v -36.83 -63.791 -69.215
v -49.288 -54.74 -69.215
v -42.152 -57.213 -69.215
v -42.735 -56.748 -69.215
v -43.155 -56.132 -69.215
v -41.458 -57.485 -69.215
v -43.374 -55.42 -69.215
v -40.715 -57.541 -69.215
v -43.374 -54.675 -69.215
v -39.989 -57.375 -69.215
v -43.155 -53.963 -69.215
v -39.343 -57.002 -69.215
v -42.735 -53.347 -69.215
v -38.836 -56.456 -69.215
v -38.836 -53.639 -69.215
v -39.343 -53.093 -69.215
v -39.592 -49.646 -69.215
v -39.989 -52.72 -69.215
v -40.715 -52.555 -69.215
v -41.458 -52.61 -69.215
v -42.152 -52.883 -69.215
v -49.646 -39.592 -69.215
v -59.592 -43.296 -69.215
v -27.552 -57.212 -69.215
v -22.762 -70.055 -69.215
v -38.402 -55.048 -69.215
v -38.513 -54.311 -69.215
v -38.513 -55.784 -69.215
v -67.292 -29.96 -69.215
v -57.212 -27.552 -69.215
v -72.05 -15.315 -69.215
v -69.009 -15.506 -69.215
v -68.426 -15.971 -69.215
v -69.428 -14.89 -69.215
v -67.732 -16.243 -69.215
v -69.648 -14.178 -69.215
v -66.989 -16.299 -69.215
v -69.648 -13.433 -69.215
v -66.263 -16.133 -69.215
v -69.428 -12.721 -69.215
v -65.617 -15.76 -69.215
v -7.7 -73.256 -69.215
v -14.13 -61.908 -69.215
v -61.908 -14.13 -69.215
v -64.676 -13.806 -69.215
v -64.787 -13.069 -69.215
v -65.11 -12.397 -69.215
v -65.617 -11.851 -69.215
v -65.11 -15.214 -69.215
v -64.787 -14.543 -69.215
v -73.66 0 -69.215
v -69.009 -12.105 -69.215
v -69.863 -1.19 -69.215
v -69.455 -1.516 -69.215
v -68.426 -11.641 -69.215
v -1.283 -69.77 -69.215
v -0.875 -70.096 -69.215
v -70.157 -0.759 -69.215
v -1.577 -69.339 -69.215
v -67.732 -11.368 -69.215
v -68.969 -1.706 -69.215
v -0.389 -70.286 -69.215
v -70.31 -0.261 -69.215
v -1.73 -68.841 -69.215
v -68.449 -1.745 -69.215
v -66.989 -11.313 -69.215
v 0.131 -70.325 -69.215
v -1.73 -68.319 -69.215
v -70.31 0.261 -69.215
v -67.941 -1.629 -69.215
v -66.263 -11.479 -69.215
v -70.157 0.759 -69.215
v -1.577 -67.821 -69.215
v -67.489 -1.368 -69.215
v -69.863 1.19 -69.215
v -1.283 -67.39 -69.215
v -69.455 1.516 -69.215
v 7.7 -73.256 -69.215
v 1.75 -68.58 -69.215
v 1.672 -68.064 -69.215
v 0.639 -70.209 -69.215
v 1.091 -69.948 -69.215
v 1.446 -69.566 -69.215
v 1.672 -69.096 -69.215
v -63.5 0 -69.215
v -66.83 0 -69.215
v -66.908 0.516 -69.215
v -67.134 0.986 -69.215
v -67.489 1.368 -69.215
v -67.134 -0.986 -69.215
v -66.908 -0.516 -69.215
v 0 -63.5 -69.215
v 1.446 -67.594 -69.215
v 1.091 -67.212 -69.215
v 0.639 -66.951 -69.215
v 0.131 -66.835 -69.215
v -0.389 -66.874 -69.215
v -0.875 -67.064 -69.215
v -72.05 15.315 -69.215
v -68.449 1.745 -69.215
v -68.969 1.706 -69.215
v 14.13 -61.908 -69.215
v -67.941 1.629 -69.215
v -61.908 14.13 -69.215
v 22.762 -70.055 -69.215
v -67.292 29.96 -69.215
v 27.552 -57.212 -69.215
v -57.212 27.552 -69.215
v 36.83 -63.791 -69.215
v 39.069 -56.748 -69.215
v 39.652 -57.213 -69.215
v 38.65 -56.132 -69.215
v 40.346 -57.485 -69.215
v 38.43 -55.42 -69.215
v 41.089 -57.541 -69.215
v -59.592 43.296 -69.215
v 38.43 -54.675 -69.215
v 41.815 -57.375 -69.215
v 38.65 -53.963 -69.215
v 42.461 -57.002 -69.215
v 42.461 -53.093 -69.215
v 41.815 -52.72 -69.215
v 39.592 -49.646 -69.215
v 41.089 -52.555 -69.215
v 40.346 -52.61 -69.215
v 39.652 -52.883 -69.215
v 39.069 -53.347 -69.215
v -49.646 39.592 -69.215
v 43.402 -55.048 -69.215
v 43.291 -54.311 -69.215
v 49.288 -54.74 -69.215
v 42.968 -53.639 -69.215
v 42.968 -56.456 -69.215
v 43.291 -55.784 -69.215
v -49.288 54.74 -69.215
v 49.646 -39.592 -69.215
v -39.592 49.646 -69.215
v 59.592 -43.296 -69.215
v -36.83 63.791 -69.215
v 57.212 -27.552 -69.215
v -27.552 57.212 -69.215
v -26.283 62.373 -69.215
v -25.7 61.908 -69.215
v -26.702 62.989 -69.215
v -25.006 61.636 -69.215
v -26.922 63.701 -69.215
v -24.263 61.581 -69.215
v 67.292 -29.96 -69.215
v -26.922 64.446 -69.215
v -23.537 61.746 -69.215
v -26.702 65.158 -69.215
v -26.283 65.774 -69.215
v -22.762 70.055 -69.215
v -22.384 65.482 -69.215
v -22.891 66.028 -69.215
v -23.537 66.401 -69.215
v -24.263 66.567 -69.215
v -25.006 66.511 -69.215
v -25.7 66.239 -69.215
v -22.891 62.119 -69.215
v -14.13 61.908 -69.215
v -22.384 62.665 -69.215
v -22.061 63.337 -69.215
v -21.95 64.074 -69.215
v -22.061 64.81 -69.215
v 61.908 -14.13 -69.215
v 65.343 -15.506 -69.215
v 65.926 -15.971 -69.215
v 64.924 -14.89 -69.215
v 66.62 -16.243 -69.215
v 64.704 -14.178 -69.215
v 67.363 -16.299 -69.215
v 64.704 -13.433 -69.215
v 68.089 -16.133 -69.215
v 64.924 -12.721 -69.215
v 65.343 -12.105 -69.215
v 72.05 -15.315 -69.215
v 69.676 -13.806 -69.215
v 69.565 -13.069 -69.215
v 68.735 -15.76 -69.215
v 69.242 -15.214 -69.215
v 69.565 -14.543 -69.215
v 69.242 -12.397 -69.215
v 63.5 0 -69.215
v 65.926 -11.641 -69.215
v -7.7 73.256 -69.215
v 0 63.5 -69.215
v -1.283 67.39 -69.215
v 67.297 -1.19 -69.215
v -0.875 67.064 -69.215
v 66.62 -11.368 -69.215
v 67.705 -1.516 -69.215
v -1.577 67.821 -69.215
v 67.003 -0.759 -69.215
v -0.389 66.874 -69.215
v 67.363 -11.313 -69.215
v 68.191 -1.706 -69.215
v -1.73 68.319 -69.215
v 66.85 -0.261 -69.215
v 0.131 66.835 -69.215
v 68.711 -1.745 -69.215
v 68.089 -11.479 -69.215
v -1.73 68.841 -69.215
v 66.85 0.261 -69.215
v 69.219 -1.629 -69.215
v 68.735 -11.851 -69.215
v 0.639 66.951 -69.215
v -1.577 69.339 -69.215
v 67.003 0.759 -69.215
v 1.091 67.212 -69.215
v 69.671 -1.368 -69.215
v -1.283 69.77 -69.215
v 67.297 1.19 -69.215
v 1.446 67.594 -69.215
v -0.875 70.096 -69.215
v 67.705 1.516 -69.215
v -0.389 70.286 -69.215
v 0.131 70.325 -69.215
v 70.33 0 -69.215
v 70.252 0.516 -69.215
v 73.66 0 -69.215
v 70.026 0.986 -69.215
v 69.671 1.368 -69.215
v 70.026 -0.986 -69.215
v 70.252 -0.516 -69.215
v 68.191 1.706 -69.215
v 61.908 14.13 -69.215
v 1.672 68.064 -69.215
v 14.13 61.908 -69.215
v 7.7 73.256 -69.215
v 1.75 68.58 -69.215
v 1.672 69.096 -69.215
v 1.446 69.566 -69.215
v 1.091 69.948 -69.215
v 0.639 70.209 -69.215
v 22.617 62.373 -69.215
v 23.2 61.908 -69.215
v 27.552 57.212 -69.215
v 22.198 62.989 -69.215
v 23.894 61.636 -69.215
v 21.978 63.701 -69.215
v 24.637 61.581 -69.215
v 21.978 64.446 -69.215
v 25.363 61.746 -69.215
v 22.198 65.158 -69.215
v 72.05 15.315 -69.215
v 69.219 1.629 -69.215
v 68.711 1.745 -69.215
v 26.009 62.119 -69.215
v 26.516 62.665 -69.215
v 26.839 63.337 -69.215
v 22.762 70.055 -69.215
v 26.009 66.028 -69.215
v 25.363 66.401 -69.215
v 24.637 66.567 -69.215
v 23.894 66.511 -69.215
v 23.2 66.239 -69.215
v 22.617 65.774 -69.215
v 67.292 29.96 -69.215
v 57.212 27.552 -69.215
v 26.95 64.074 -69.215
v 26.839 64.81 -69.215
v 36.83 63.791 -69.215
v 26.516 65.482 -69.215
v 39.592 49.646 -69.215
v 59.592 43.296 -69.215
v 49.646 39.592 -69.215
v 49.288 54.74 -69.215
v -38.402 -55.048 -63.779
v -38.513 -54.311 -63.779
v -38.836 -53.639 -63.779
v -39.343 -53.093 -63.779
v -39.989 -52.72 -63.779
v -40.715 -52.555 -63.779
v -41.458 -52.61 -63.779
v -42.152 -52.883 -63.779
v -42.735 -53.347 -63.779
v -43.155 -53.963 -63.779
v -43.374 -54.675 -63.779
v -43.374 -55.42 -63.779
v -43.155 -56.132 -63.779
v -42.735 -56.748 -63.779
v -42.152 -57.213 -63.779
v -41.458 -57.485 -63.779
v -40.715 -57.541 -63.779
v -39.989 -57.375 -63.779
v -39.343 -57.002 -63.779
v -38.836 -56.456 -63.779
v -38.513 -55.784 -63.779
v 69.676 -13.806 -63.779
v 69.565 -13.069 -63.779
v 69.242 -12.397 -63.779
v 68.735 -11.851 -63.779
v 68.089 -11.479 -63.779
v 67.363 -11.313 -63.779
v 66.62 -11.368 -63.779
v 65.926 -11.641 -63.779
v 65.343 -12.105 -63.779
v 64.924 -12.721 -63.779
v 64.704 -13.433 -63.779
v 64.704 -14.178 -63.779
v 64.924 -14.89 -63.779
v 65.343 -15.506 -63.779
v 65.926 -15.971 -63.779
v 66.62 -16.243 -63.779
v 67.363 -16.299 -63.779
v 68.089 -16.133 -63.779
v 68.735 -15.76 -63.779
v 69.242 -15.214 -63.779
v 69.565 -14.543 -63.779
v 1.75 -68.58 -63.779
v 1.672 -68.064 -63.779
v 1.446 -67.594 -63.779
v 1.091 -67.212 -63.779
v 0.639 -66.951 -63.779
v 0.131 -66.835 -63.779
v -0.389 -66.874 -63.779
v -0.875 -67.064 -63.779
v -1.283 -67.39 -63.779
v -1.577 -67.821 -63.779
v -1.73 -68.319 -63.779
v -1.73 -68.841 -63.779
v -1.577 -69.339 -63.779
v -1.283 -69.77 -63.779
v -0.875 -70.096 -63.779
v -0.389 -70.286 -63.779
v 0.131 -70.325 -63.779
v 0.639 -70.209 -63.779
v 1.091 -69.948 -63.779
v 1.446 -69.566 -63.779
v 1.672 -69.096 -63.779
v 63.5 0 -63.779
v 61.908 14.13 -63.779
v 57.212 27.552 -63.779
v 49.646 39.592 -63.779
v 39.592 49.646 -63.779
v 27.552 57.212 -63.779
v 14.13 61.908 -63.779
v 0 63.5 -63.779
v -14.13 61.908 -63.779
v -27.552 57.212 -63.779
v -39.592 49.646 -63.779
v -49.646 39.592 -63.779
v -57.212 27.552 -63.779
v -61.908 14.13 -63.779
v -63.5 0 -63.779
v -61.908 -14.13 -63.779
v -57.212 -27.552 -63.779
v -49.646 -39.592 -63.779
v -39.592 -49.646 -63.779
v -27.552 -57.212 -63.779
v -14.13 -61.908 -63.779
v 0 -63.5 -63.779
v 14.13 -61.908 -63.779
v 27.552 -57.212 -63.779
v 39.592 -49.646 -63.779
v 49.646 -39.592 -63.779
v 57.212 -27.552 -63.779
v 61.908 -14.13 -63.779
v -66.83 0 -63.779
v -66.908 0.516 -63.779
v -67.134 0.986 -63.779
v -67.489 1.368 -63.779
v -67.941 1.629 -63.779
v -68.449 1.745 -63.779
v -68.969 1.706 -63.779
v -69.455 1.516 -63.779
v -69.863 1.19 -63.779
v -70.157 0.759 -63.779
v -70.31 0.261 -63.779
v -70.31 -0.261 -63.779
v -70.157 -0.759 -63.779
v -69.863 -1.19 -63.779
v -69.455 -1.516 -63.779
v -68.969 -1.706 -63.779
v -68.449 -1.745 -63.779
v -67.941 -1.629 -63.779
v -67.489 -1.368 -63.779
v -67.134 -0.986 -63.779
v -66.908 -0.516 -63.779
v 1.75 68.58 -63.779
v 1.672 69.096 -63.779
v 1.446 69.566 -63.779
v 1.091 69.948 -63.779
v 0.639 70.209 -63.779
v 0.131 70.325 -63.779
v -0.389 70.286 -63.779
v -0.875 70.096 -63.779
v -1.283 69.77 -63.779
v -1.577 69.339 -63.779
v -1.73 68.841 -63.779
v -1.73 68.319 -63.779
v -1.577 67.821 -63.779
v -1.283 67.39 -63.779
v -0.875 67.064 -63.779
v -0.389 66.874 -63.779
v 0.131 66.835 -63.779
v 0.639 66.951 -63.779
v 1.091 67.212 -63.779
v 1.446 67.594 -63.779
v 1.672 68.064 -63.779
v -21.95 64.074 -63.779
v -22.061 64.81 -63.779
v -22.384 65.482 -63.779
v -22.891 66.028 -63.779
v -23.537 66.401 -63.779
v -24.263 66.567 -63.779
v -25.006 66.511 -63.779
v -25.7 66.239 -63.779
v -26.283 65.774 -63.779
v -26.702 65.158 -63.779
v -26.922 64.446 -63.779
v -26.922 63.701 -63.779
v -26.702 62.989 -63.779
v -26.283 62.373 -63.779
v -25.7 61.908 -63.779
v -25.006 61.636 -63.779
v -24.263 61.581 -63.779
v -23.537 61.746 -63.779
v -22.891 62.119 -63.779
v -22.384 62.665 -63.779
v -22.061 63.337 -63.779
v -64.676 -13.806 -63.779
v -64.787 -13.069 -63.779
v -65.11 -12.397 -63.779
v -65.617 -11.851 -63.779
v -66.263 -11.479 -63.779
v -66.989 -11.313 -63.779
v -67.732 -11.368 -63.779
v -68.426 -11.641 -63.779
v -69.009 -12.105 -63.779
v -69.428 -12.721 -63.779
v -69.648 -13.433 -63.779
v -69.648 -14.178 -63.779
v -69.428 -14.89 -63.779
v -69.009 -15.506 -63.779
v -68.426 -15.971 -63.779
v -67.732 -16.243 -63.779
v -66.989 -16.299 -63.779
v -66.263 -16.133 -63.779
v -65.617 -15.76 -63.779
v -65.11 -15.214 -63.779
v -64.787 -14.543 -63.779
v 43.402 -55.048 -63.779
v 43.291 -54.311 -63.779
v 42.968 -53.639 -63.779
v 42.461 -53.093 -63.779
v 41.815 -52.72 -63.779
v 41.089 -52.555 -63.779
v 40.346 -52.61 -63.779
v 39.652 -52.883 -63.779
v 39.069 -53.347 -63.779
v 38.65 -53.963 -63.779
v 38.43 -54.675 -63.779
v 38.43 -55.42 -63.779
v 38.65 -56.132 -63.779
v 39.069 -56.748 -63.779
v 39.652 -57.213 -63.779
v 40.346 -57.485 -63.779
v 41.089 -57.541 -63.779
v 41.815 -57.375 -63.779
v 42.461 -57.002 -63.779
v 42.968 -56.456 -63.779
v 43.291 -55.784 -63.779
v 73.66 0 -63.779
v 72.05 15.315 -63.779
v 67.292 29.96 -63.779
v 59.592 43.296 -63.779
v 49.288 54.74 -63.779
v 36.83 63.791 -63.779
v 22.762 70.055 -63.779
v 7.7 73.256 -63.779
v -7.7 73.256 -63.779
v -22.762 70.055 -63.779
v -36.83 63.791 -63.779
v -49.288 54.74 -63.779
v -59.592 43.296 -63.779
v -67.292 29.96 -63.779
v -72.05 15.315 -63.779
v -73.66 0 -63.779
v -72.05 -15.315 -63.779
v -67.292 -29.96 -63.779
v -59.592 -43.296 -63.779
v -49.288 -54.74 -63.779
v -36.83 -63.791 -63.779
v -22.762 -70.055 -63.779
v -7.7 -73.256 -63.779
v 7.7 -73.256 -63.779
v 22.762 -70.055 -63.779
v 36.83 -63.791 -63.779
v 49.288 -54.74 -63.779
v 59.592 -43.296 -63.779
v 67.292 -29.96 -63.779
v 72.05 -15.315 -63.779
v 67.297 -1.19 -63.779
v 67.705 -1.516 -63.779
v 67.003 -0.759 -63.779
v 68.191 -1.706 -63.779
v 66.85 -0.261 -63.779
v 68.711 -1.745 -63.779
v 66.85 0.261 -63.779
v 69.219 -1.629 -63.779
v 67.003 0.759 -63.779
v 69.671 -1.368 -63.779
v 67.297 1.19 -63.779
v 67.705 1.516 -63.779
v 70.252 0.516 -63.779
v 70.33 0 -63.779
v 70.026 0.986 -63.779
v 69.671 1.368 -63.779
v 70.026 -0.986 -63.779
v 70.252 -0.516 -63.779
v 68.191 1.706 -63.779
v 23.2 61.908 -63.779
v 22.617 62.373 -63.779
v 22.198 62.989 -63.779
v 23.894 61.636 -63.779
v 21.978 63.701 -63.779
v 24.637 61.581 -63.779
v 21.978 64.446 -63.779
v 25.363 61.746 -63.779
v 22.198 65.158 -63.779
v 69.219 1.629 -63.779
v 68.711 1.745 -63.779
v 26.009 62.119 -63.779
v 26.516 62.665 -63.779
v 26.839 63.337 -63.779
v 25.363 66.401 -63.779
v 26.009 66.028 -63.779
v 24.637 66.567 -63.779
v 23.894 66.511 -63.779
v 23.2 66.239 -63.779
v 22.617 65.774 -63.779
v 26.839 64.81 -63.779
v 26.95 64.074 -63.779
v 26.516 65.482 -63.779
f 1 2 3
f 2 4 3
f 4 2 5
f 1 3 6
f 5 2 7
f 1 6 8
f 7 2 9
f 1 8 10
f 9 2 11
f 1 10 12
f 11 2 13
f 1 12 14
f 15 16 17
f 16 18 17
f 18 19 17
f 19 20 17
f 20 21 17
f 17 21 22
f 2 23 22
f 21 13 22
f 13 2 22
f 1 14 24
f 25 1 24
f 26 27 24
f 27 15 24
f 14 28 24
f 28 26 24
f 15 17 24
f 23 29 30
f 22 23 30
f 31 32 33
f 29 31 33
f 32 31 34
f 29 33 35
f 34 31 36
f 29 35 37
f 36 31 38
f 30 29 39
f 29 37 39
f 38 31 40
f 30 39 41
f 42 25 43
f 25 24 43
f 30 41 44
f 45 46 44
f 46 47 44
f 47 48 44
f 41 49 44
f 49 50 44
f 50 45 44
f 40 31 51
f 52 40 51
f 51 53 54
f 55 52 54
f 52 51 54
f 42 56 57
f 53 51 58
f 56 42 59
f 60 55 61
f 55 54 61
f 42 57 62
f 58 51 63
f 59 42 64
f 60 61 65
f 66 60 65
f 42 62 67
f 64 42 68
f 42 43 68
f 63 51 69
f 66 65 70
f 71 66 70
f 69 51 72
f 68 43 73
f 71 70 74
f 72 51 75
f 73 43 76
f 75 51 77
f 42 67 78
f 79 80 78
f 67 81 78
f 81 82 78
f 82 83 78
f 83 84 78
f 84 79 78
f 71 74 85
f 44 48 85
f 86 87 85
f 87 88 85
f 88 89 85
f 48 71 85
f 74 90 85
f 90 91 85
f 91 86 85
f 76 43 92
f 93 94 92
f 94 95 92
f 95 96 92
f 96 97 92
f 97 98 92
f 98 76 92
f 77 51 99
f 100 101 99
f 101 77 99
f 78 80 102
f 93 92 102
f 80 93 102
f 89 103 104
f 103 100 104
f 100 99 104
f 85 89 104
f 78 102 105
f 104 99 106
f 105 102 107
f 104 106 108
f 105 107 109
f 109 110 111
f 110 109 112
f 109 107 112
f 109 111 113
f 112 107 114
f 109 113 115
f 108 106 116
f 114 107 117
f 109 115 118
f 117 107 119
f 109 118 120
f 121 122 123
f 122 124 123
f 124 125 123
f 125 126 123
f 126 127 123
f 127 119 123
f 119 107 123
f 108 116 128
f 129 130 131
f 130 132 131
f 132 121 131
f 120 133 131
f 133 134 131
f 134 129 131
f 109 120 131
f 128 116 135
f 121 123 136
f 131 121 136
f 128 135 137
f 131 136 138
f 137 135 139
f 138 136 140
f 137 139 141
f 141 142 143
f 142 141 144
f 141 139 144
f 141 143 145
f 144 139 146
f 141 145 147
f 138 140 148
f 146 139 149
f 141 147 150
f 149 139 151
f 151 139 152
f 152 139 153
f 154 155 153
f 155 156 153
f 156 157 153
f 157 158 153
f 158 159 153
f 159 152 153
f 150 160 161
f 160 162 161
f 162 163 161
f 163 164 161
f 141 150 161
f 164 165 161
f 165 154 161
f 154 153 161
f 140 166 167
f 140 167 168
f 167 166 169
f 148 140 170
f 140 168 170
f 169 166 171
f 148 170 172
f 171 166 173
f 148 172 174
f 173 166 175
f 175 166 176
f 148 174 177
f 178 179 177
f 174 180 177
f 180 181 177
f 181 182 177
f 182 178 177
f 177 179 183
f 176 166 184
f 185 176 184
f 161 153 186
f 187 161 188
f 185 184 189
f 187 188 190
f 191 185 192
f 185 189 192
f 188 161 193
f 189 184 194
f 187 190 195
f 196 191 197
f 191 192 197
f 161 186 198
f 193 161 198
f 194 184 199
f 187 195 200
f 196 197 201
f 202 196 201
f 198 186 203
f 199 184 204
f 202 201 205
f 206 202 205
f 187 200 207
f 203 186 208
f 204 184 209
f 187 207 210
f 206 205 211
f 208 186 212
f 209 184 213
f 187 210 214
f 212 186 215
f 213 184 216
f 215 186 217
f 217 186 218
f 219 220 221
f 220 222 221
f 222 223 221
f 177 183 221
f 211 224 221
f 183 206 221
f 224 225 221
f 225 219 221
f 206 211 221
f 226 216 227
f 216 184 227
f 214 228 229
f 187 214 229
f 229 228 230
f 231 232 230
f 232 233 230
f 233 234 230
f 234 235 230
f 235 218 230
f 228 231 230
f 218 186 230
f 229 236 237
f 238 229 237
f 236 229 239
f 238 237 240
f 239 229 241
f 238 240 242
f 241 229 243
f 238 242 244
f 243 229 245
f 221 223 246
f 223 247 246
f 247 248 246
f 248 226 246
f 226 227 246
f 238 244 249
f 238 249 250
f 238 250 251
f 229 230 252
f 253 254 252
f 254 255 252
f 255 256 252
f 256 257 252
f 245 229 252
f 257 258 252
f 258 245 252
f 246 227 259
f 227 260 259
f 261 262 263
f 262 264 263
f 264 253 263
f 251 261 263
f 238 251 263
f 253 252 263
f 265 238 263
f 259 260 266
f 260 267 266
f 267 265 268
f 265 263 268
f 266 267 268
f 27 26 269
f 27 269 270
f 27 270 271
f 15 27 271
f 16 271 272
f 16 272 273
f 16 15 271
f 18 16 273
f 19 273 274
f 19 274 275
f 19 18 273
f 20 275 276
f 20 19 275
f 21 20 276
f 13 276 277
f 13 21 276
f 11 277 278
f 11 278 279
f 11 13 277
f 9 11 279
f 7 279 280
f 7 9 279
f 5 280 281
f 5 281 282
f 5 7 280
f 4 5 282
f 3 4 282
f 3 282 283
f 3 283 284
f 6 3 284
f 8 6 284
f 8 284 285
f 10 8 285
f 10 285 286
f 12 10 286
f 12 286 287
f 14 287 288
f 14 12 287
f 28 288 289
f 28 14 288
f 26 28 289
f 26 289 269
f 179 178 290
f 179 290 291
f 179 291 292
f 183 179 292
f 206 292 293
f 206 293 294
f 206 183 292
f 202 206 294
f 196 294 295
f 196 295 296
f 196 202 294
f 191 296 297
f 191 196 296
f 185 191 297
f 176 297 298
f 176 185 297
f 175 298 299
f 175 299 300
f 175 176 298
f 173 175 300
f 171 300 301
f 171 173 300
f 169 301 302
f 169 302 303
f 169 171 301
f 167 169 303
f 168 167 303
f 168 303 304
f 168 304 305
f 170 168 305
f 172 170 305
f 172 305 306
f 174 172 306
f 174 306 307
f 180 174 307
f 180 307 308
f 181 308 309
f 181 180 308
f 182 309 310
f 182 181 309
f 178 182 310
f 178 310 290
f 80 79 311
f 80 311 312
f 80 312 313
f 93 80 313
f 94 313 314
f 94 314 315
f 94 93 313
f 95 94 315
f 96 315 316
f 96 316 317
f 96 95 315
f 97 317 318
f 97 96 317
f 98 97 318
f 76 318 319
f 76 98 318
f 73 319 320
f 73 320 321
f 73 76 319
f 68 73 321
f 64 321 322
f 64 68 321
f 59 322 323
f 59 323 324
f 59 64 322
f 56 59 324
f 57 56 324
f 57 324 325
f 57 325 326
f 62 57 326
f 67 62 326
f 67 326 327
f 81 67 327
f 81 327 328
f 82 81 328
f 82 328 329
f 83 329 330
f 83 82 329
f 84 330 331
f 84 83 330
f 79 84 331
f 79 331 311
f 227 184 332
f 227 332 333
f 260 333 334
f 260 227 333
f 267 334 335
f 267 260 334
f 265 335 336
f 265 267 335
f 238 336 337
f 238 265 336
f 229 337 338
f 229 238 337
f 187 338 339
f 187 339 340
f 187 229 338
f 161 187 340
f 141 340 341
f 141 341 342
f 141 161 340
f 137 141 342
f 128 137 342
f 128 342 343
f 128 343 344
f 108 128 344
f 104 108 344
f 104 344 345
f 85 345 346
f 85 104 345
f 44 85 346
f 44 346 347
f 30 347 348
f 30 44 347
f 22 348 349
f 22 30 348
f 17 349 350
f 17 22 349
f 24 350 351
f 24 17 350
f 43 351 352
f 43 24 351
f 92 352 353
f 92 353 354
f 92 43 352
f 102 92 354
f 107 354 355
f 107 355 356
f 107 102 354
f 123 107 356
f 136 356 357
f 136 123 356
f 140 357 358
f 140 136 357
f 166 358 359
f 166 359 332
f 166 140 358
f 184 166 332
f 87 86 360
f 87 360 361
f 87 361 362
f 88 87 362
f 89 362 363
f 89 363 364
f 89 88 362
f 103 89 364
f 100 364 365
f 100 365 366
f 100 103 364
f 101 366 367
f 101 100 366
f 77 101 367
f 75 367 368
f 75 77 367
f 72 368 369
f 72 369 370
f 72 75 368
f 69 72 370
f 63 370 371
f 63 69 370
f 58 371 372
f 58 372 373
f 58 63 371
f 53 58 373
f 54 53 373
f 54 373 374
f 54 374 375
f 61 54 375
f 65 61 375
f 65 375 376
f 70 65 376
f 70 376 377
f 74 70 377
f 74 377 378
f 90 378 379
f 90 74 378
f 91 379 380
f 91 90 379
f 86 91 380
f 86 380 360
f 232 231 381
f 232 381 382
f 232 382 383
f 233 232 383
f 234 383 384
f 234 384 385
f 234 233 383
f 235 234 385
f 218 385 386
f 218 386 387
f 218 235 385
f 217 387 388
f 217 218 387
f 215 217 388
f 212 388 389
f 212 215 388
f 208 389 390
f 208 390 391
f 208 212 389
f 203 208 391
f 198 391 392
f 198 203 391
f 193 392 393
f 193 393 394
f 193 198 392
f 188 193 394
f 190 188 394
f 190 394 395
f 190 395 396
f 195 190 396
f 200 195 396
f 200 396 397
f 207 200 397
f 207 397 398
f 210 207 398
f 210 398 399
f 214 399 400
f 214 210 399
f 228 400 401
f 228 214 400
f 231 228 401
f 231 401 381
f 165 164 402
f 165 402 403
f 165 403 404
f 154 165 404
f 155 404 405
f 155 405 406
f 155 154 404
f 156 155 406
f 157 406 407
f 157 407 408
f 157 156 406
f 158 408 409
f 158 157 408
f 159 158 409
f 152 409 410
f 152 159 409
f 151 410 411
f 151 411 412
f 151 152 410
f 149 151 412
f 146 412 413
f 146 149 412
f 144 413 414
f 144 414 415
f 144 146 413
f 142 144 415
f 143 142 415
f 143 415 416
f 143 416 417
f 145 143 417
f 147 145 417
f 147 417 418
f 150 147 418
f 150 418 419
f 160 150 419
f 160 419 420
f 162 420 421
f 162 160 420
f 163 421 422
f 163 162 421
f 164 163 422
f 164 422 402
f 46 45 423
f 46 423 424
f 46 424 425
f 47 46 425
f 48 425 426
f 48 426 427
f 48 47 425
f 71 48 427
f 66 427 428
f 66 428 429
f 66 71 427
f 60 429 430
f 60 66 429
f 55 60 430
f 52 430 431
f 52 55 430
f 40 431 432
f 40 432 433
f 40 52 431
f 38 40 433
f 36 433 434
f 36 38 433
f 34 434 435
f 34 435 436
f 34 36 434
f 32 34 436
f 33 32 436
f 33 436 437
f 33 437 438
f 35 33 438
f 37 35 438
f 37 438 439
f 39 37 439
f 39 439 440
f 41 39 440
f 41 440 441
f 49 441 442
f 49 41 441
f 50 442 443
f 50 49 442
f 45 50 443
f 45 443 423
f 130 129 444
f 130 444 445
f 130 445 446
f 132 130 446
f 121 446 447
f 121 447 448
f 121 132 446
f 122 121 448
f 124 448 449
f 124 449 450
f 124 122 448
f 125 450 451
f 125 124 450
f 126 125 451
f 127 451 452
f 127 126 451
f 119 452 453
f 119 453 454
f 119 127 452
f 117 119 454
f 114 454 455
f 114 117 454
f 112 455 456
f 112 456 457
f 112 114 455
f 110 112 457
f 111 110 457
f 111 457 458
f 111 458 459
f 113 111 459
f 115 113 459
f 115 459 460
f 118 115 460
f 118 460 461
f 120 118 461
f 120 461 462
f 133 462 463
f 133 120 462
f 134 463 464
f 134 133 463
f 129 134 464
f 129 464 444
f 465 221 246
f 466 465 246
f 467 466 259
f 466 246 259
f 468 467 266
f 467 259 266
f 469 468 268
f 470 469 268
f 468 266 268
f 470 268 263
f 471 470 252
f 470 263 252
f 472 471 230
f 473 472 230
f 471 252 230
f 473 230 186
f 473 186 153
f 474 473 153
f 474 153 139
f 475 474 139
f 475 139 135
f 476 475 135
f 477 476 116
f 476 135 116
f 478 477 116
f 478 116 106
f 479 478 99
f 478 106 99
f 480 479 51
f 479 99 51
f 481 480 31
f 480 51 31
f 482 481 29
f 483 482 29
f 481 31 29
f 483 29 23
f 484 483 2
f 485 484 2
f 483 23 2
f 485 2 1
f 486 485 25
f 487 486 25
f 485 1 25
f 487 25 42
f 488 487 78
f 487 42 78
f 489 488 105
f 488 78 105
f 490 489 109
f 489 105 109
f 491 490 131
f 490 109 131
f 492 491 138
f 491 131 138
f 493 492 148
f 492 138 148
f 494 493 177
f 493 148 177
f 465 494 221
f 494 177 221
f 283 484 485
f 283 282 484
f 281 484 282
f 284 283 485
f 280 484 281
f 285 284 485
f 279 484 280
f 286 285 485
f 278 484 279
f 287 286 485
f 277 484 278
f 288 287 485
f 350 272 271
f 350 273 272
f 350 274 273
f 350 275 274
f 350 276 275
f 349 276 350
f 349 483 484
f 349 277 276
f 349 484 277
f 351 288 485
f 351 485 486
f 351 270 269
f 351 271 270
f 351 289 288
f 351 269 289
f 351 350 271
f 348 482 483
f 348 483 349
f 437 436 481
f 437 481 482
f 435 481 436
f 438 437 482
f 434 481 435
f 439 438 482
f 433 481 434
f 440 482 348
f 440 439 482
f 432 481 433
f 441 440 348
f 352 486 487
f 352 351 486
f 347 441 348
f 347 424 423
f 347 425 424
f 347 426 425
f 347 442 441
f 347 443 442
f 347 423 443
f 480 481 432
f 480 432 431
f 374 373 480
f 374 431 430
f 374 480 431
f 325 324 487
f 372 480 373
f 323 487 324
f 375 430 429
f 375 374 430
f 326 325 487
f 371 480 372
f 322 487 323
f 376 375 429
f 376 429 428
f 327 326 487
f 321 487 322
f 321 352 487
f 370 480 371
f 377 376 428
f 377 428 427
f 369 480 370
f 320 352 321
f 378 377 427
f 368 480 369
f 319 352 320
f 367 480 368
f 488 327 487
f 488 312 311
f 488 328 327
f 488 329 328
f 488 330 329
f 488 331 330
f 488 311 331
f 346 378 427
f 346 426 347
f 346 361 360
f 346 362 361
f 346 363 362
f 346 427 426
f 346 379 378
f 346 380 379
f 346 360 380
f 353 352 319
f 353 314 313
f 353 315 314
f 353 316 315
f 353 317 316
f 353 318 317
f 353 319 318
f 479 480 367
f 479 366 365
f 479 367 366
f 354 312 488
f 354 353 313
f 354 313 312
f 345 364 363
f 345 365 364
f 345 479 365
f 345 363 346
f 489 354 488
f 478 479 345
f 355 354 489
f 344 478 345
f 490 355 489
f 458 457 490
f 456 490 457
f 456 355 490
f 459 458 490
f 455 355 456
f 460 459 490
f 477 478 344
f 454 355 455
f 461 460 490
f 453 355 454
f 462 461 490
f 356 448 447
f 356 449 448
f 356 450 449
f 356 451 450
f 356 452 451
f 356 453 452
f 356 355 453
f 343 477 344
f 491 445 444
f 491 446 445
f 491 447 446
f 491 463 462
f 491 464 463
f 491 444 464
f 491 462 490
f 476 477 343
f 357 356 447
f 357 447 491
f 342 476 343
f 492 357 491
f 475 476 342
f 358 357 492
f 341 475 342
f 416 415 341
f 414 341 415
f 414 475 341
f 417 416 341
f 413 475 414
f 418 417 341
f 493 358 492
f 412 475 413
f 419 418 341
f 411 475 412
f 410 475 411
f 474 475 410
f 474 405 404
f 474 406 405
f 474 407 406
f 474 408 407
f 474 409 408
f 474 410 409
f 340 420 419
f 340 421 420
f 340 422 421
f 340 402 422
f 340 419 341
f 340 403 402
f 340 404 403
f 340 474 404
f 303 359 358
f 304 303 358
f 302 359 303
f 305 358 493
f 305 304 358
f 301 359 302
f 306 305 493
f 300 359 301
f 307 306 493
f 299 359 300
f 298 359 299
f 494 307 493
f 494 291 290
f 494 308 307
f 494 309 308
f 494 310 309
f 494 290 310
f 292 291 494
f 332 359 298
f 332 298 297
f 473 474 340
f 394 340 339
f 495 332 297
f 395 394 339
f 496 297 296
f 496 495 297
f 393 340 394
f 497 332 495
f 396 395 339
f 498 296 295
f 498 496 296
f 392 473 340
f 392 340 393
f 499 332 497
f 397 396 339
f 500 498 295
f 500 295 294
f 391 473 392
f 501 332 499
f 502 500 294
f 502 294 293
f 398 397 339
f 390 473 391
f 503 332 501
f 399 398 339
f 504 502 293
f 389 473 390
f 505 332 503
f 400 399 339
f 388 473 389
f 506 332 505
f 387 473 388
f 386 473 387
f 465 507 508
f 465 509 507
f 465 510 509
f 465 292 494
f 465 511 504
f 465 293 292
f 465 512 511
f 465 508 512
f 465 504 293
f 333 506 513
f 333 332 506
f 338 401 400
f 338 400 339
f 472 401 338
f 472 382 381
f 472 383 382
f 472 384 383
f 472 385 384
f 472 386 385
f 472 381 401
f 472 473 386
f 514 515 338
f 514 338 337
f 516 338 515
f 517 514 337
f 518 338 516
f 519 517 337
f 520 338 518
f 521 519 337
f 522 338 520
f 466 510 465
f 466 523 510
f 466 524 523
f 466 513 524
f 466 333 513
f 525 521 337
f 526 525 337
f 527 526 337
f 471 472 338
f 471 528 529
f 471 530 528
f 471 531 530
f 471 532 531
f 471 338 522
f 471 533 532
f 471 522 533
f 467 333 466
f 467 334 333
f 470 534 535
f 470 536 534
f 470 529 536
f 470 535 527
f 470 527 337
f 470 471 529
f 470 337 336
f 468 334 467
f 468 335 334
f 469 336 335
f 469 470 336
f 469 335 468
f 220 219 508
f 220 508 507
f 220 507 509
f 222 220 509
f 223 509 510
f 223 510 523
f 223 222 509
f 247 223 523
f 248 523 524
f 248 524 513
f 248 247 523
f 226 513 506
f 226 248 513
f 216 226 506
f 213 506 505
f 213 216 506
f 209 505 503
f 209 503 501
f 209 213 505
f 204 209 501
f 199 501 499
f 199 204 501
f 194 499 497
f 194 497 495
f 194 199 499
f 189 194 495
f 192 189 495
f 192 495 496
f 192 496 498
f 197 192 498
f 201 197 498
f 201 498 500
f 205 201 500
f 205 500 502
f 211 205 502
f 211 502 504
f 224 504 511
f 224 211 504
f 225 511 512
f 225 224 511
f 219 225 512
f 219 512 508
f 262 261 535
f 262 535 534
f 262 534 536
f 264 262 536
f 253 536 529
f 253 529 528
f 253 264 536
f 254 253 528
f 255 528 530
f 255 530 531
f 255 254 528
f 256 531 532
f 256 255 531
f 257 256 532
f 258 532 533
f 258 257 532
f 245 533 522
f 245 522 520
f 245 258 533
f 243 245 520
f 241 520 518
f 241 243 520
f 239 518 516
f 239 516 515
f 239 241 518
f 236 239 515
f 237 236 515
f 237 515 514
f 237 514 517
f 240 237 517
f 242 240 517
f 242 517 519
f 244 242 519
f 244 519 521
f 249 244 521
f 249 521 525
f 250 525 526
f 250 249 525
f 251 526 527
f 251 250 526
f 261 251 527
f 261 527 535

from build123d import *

# Parameters (mm, degrees)
SKETCH2_R           = 73.66
SKETCH2_R_2         = 63.5
SKETCH2_R_3         = 1.75
SKETCH2_R_4         = 2.5
BOSS_EXTRUDE1_DEPTH = 5.4356


with BuildPart() as part:
    # Sketch2 → Boss-Extrude1 (new body)
    with BuildSketch(Plane.XY.offset(-69.215)):
        Circle(SKETCH2_R)
        Circle(SKETCH2_R_2, mode=Mode.SUBTRACT)
        with Locations((-68.58, 0)):
            Circle(SKETCH2_R_3, mode=Mode.SUBTRACT)
        with Locations((0, 68.58)):
            Circle(SKETCH2_R_3, mode=Mode.SUBTRACT)
        with Locations((68.58, 0)):
            Circle(SKETCH2_R_3, mode=Mode.SUBTRACT)
        with Locations((0, -68.58)):
            Circle(SKETCH2_R_3, mode=Mode.SUBTRACT)
        with Locations((-24.449968278, 64.073515989)):
            Circle(SKETCH2_R_4, mode=Mode.SUBTRACT)
        with Locations((24.449968278, 64.073515989)):
            Circle(SKETCH2_R_4, mode=Mode.SUBTRACT)
        with Locations((-67.176013668, -13.80578095)):
            Circle(SKETCH2_R_4, mode=Mode.SUBTRACT)
        with Locations((-40.902096909, -55.047569142)):
            Circle(SKETCH2_R_4, mode=Mode.SUBTRACT)
        with Locations((40.902096909, -55.047569142)):
            Circle(SKETCH2_R_4, mode=Mode.SUBTRACT)
        with Locations((67.176013668, -13.80578095)):
            Circle(SKETCH2_R_4, mode=Mode.SUBTRACT)
    extrude(amount=BOSS_EXTRUDE1_DEPTH)


solid = part.part
